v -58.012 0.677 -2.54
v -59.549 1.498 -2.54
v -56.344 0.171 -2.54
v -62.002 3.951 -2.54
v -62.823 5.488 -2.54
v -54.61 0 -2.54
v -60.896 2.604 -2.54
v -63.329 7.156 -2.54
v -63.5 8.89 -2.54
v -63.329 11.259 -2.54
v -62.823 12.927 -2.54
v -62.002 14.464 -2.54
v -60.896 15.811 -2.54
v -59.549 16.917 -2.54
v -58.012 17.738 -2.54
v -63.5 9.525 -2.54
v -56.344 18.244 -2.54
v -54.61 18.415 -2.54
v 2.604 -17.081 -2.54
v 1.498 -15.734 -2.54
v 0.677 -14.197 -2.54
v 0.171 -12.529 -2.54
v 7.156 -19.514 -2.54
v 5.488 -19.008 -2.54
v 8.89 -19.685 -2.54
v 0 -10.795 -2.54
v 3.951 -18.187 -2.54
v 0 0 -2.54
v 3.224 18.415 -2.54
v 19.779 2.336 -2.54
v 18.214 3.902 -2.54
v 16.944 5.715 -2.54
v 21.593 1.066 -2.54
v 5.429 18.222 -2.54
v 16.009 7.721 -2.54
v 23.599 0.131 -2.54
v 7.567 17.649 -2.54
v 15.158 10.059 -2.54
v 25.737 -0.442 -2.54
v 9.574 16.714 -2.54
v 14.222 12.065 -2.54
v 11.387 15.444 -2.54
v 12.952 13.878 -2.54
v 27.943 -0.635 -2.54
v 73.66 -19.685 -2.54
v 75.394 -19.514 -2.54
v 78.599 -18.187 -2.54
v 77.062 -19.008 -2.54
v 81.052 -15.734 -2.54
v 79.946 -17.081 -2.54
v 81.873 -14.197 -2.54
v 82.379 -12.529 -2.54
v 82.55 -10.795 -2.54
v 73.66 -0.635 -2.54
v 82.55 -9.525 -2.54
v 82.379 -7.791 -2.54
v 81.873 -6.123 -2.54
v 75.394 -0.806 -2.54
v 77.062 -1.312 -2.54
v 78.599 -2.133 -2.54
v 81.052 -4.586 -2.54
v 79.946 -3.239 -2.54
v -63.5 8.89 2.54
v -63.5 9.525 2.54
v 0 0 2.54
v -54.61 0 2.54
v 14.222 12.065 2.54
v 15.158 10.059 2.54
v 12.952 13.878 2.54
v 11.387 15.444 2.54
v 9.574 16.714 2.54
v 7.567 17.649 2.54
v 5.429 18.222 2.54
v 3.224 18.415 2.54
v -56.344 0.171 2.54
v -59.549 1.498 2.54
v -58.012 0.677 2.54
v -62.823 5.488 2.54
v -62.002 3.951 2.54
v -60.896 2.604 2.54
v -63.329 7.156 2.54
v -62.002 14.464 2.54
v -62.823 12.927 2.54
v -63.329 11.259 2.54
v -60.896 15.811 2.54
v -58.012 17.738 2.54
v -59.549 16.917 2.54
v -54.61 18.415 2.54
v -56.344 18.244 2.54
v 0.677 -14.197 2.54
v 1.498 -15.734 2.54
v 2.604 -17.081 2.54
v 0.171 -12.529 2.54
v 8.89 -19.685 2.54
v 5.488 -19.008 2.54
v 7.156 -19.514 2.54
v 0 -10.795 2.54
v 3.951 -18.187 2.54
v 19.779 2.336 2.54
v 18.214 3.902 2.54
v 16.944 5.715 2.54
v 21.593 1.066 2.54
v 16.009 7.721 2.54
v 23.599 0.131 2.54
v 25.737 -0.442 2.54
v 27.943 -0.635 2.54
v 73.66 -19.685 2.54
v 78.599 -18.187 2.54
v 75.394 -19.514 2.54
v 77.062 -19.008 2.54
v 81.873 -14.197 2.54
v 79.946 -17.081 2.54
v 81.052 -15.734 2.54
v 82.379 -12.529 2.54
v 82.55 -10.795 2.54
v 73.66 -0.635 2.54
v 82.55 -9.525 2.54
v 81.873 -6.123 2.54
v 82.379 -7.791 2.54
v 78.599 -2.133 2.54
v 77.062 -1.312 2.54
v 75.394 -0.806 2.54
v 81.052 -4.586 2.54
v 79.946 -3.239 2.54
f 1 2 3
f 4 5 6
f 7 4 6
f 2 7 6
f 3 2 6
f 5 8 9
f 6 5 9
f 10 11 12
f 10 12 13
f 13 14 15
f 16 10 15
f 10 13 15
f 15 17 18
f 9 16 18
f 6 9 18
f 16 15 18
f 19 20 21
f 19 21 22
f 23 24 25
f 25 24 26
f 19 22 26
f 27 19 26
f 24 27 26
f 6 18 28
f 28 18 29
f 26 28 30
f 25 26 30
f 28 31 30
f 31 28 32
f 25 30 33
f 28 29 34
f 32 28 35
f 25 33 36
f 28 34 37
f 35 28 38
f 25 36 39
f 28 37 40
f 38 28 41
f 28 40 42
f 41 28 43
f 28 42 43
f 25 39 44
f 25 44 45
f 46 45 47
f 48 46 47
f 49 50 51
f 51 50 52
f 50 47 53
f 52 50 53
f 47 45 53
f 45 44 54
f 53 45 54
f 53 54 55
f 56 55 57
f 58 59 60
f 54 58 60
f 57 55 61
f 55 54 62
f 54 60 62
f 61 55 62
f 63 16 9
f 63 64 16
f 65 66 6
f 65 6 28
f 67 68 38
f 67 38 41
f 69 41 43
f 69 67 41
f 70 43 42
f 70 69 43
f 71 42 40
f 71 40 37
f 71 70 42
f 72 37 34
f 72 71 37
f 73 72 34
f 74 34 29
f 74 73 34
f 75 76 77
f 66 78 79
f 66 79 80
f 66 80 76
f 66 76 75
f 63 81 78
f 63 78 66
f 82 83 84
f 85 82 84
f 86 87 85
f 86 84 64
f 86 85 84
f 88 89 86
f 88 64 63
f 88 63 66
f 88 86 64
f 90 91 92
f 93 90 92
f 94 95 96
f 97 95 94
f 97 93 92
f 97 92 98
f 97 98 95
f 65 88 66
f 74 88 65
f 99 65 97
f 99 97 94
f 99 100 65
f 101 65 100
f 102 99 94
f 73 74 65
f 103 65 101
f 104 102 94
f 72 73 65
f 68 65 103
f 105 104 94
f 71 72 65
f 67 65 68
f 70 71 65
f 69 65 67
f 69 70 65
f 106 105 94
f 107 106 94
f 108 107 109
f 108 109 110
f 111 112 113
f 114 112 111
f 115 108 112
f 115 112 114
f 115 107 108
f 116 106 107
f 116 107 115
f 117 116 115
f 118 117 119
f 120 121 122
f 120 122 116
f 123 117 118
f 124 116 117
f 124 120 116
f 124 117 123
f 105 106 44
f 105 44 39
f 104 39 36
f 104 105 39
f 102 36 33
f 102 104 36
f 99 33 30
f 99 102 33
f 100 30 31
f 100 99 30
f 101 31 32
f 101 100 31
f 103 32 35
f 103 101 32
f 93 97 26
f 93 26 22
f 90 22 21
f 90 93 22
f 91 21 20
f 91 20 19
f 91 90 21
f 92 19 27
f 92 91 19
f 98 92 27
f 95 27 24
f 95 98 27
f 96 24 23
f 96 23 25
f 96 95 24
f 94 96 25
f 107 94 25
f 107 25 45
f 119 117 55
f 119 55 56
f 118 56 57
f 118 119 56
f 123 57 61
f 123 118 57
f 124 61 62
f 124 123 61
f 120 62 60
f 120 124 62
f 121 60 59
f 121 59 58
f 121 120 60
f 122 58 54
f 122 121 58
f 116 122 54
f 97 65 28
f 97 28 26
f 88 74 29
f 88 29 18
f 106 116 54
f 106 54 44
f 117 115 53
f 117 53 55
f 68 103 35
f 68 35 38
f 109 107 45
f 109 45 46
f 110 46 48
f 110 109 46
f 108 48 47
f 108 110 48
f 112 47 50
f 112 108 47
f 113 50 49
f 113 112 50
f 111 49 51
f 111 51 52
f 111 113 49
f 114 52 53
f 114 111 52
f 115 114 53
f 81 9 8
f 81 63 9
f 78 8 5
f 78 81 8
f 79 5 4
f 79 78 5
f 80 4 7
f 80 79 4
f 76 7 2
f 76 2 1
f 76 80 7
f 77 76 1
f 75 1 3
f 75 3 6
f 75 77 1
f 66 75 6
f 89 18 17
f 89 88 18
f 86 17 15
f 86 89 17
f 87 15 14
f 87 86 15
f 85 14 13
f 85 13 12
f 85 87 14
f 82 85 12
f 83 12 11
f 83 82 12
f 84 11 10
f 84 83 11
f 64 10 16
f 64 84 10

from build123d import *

# Parameters (mm, degrees)
F1_DEPTH = 2.54


with BuildPart() as f1:
    # F0 (on Top) → F1 (new body, symmetric)
    with BuildSketch(Plane.XY):
        with BuildLine():
            ThreePointArc((-63.5, 8.89), (-60.896179, 2.603821), (-54.61, 0))
            Line((-54.61, 0), (0, 0))
            Line((0, 0), (0, -10.795))
            ThreePointArc((0, -10.795), (2.603821, -17.081179), (8.89, -19.685))
            Line((8.89, -19.685), (73.66, -19.685))
            ThreePointArc((73.66, -19.685), (79.946179, -17.081179), (82.55, -10.795))
            Line((82.55, -10.795), (82.55, -9.525))
            ThreePointArc((82.55, -9.525), (79.946179, -3.238821), (73.66, -0.635))
            Line((73.66, -0.635), (27.942636, -0.635))
            ThreePointArc((27.942636, -0.635), (20.658215, 1.661769), (16.008539, 7.721344))
            Line((16.008539, 7.721344), (15.157828, 10.058656))
            ThreePointArc((15.157828, 10.058656), (10.508152, 16.118231), (3.223731, 18.415))
            Line((3.223731, 18.415), (-54.61, 18.415))
            ThreePointArc((-54.61, 18.415), (-60.896179, 15.811179), (-63.5, 9.525))
            Line((-63.5, 9.525), (-63.5, 8.89))
        make_face()
    extrude(amount=F1_DEPTH, both=True)


solid = f1.part
